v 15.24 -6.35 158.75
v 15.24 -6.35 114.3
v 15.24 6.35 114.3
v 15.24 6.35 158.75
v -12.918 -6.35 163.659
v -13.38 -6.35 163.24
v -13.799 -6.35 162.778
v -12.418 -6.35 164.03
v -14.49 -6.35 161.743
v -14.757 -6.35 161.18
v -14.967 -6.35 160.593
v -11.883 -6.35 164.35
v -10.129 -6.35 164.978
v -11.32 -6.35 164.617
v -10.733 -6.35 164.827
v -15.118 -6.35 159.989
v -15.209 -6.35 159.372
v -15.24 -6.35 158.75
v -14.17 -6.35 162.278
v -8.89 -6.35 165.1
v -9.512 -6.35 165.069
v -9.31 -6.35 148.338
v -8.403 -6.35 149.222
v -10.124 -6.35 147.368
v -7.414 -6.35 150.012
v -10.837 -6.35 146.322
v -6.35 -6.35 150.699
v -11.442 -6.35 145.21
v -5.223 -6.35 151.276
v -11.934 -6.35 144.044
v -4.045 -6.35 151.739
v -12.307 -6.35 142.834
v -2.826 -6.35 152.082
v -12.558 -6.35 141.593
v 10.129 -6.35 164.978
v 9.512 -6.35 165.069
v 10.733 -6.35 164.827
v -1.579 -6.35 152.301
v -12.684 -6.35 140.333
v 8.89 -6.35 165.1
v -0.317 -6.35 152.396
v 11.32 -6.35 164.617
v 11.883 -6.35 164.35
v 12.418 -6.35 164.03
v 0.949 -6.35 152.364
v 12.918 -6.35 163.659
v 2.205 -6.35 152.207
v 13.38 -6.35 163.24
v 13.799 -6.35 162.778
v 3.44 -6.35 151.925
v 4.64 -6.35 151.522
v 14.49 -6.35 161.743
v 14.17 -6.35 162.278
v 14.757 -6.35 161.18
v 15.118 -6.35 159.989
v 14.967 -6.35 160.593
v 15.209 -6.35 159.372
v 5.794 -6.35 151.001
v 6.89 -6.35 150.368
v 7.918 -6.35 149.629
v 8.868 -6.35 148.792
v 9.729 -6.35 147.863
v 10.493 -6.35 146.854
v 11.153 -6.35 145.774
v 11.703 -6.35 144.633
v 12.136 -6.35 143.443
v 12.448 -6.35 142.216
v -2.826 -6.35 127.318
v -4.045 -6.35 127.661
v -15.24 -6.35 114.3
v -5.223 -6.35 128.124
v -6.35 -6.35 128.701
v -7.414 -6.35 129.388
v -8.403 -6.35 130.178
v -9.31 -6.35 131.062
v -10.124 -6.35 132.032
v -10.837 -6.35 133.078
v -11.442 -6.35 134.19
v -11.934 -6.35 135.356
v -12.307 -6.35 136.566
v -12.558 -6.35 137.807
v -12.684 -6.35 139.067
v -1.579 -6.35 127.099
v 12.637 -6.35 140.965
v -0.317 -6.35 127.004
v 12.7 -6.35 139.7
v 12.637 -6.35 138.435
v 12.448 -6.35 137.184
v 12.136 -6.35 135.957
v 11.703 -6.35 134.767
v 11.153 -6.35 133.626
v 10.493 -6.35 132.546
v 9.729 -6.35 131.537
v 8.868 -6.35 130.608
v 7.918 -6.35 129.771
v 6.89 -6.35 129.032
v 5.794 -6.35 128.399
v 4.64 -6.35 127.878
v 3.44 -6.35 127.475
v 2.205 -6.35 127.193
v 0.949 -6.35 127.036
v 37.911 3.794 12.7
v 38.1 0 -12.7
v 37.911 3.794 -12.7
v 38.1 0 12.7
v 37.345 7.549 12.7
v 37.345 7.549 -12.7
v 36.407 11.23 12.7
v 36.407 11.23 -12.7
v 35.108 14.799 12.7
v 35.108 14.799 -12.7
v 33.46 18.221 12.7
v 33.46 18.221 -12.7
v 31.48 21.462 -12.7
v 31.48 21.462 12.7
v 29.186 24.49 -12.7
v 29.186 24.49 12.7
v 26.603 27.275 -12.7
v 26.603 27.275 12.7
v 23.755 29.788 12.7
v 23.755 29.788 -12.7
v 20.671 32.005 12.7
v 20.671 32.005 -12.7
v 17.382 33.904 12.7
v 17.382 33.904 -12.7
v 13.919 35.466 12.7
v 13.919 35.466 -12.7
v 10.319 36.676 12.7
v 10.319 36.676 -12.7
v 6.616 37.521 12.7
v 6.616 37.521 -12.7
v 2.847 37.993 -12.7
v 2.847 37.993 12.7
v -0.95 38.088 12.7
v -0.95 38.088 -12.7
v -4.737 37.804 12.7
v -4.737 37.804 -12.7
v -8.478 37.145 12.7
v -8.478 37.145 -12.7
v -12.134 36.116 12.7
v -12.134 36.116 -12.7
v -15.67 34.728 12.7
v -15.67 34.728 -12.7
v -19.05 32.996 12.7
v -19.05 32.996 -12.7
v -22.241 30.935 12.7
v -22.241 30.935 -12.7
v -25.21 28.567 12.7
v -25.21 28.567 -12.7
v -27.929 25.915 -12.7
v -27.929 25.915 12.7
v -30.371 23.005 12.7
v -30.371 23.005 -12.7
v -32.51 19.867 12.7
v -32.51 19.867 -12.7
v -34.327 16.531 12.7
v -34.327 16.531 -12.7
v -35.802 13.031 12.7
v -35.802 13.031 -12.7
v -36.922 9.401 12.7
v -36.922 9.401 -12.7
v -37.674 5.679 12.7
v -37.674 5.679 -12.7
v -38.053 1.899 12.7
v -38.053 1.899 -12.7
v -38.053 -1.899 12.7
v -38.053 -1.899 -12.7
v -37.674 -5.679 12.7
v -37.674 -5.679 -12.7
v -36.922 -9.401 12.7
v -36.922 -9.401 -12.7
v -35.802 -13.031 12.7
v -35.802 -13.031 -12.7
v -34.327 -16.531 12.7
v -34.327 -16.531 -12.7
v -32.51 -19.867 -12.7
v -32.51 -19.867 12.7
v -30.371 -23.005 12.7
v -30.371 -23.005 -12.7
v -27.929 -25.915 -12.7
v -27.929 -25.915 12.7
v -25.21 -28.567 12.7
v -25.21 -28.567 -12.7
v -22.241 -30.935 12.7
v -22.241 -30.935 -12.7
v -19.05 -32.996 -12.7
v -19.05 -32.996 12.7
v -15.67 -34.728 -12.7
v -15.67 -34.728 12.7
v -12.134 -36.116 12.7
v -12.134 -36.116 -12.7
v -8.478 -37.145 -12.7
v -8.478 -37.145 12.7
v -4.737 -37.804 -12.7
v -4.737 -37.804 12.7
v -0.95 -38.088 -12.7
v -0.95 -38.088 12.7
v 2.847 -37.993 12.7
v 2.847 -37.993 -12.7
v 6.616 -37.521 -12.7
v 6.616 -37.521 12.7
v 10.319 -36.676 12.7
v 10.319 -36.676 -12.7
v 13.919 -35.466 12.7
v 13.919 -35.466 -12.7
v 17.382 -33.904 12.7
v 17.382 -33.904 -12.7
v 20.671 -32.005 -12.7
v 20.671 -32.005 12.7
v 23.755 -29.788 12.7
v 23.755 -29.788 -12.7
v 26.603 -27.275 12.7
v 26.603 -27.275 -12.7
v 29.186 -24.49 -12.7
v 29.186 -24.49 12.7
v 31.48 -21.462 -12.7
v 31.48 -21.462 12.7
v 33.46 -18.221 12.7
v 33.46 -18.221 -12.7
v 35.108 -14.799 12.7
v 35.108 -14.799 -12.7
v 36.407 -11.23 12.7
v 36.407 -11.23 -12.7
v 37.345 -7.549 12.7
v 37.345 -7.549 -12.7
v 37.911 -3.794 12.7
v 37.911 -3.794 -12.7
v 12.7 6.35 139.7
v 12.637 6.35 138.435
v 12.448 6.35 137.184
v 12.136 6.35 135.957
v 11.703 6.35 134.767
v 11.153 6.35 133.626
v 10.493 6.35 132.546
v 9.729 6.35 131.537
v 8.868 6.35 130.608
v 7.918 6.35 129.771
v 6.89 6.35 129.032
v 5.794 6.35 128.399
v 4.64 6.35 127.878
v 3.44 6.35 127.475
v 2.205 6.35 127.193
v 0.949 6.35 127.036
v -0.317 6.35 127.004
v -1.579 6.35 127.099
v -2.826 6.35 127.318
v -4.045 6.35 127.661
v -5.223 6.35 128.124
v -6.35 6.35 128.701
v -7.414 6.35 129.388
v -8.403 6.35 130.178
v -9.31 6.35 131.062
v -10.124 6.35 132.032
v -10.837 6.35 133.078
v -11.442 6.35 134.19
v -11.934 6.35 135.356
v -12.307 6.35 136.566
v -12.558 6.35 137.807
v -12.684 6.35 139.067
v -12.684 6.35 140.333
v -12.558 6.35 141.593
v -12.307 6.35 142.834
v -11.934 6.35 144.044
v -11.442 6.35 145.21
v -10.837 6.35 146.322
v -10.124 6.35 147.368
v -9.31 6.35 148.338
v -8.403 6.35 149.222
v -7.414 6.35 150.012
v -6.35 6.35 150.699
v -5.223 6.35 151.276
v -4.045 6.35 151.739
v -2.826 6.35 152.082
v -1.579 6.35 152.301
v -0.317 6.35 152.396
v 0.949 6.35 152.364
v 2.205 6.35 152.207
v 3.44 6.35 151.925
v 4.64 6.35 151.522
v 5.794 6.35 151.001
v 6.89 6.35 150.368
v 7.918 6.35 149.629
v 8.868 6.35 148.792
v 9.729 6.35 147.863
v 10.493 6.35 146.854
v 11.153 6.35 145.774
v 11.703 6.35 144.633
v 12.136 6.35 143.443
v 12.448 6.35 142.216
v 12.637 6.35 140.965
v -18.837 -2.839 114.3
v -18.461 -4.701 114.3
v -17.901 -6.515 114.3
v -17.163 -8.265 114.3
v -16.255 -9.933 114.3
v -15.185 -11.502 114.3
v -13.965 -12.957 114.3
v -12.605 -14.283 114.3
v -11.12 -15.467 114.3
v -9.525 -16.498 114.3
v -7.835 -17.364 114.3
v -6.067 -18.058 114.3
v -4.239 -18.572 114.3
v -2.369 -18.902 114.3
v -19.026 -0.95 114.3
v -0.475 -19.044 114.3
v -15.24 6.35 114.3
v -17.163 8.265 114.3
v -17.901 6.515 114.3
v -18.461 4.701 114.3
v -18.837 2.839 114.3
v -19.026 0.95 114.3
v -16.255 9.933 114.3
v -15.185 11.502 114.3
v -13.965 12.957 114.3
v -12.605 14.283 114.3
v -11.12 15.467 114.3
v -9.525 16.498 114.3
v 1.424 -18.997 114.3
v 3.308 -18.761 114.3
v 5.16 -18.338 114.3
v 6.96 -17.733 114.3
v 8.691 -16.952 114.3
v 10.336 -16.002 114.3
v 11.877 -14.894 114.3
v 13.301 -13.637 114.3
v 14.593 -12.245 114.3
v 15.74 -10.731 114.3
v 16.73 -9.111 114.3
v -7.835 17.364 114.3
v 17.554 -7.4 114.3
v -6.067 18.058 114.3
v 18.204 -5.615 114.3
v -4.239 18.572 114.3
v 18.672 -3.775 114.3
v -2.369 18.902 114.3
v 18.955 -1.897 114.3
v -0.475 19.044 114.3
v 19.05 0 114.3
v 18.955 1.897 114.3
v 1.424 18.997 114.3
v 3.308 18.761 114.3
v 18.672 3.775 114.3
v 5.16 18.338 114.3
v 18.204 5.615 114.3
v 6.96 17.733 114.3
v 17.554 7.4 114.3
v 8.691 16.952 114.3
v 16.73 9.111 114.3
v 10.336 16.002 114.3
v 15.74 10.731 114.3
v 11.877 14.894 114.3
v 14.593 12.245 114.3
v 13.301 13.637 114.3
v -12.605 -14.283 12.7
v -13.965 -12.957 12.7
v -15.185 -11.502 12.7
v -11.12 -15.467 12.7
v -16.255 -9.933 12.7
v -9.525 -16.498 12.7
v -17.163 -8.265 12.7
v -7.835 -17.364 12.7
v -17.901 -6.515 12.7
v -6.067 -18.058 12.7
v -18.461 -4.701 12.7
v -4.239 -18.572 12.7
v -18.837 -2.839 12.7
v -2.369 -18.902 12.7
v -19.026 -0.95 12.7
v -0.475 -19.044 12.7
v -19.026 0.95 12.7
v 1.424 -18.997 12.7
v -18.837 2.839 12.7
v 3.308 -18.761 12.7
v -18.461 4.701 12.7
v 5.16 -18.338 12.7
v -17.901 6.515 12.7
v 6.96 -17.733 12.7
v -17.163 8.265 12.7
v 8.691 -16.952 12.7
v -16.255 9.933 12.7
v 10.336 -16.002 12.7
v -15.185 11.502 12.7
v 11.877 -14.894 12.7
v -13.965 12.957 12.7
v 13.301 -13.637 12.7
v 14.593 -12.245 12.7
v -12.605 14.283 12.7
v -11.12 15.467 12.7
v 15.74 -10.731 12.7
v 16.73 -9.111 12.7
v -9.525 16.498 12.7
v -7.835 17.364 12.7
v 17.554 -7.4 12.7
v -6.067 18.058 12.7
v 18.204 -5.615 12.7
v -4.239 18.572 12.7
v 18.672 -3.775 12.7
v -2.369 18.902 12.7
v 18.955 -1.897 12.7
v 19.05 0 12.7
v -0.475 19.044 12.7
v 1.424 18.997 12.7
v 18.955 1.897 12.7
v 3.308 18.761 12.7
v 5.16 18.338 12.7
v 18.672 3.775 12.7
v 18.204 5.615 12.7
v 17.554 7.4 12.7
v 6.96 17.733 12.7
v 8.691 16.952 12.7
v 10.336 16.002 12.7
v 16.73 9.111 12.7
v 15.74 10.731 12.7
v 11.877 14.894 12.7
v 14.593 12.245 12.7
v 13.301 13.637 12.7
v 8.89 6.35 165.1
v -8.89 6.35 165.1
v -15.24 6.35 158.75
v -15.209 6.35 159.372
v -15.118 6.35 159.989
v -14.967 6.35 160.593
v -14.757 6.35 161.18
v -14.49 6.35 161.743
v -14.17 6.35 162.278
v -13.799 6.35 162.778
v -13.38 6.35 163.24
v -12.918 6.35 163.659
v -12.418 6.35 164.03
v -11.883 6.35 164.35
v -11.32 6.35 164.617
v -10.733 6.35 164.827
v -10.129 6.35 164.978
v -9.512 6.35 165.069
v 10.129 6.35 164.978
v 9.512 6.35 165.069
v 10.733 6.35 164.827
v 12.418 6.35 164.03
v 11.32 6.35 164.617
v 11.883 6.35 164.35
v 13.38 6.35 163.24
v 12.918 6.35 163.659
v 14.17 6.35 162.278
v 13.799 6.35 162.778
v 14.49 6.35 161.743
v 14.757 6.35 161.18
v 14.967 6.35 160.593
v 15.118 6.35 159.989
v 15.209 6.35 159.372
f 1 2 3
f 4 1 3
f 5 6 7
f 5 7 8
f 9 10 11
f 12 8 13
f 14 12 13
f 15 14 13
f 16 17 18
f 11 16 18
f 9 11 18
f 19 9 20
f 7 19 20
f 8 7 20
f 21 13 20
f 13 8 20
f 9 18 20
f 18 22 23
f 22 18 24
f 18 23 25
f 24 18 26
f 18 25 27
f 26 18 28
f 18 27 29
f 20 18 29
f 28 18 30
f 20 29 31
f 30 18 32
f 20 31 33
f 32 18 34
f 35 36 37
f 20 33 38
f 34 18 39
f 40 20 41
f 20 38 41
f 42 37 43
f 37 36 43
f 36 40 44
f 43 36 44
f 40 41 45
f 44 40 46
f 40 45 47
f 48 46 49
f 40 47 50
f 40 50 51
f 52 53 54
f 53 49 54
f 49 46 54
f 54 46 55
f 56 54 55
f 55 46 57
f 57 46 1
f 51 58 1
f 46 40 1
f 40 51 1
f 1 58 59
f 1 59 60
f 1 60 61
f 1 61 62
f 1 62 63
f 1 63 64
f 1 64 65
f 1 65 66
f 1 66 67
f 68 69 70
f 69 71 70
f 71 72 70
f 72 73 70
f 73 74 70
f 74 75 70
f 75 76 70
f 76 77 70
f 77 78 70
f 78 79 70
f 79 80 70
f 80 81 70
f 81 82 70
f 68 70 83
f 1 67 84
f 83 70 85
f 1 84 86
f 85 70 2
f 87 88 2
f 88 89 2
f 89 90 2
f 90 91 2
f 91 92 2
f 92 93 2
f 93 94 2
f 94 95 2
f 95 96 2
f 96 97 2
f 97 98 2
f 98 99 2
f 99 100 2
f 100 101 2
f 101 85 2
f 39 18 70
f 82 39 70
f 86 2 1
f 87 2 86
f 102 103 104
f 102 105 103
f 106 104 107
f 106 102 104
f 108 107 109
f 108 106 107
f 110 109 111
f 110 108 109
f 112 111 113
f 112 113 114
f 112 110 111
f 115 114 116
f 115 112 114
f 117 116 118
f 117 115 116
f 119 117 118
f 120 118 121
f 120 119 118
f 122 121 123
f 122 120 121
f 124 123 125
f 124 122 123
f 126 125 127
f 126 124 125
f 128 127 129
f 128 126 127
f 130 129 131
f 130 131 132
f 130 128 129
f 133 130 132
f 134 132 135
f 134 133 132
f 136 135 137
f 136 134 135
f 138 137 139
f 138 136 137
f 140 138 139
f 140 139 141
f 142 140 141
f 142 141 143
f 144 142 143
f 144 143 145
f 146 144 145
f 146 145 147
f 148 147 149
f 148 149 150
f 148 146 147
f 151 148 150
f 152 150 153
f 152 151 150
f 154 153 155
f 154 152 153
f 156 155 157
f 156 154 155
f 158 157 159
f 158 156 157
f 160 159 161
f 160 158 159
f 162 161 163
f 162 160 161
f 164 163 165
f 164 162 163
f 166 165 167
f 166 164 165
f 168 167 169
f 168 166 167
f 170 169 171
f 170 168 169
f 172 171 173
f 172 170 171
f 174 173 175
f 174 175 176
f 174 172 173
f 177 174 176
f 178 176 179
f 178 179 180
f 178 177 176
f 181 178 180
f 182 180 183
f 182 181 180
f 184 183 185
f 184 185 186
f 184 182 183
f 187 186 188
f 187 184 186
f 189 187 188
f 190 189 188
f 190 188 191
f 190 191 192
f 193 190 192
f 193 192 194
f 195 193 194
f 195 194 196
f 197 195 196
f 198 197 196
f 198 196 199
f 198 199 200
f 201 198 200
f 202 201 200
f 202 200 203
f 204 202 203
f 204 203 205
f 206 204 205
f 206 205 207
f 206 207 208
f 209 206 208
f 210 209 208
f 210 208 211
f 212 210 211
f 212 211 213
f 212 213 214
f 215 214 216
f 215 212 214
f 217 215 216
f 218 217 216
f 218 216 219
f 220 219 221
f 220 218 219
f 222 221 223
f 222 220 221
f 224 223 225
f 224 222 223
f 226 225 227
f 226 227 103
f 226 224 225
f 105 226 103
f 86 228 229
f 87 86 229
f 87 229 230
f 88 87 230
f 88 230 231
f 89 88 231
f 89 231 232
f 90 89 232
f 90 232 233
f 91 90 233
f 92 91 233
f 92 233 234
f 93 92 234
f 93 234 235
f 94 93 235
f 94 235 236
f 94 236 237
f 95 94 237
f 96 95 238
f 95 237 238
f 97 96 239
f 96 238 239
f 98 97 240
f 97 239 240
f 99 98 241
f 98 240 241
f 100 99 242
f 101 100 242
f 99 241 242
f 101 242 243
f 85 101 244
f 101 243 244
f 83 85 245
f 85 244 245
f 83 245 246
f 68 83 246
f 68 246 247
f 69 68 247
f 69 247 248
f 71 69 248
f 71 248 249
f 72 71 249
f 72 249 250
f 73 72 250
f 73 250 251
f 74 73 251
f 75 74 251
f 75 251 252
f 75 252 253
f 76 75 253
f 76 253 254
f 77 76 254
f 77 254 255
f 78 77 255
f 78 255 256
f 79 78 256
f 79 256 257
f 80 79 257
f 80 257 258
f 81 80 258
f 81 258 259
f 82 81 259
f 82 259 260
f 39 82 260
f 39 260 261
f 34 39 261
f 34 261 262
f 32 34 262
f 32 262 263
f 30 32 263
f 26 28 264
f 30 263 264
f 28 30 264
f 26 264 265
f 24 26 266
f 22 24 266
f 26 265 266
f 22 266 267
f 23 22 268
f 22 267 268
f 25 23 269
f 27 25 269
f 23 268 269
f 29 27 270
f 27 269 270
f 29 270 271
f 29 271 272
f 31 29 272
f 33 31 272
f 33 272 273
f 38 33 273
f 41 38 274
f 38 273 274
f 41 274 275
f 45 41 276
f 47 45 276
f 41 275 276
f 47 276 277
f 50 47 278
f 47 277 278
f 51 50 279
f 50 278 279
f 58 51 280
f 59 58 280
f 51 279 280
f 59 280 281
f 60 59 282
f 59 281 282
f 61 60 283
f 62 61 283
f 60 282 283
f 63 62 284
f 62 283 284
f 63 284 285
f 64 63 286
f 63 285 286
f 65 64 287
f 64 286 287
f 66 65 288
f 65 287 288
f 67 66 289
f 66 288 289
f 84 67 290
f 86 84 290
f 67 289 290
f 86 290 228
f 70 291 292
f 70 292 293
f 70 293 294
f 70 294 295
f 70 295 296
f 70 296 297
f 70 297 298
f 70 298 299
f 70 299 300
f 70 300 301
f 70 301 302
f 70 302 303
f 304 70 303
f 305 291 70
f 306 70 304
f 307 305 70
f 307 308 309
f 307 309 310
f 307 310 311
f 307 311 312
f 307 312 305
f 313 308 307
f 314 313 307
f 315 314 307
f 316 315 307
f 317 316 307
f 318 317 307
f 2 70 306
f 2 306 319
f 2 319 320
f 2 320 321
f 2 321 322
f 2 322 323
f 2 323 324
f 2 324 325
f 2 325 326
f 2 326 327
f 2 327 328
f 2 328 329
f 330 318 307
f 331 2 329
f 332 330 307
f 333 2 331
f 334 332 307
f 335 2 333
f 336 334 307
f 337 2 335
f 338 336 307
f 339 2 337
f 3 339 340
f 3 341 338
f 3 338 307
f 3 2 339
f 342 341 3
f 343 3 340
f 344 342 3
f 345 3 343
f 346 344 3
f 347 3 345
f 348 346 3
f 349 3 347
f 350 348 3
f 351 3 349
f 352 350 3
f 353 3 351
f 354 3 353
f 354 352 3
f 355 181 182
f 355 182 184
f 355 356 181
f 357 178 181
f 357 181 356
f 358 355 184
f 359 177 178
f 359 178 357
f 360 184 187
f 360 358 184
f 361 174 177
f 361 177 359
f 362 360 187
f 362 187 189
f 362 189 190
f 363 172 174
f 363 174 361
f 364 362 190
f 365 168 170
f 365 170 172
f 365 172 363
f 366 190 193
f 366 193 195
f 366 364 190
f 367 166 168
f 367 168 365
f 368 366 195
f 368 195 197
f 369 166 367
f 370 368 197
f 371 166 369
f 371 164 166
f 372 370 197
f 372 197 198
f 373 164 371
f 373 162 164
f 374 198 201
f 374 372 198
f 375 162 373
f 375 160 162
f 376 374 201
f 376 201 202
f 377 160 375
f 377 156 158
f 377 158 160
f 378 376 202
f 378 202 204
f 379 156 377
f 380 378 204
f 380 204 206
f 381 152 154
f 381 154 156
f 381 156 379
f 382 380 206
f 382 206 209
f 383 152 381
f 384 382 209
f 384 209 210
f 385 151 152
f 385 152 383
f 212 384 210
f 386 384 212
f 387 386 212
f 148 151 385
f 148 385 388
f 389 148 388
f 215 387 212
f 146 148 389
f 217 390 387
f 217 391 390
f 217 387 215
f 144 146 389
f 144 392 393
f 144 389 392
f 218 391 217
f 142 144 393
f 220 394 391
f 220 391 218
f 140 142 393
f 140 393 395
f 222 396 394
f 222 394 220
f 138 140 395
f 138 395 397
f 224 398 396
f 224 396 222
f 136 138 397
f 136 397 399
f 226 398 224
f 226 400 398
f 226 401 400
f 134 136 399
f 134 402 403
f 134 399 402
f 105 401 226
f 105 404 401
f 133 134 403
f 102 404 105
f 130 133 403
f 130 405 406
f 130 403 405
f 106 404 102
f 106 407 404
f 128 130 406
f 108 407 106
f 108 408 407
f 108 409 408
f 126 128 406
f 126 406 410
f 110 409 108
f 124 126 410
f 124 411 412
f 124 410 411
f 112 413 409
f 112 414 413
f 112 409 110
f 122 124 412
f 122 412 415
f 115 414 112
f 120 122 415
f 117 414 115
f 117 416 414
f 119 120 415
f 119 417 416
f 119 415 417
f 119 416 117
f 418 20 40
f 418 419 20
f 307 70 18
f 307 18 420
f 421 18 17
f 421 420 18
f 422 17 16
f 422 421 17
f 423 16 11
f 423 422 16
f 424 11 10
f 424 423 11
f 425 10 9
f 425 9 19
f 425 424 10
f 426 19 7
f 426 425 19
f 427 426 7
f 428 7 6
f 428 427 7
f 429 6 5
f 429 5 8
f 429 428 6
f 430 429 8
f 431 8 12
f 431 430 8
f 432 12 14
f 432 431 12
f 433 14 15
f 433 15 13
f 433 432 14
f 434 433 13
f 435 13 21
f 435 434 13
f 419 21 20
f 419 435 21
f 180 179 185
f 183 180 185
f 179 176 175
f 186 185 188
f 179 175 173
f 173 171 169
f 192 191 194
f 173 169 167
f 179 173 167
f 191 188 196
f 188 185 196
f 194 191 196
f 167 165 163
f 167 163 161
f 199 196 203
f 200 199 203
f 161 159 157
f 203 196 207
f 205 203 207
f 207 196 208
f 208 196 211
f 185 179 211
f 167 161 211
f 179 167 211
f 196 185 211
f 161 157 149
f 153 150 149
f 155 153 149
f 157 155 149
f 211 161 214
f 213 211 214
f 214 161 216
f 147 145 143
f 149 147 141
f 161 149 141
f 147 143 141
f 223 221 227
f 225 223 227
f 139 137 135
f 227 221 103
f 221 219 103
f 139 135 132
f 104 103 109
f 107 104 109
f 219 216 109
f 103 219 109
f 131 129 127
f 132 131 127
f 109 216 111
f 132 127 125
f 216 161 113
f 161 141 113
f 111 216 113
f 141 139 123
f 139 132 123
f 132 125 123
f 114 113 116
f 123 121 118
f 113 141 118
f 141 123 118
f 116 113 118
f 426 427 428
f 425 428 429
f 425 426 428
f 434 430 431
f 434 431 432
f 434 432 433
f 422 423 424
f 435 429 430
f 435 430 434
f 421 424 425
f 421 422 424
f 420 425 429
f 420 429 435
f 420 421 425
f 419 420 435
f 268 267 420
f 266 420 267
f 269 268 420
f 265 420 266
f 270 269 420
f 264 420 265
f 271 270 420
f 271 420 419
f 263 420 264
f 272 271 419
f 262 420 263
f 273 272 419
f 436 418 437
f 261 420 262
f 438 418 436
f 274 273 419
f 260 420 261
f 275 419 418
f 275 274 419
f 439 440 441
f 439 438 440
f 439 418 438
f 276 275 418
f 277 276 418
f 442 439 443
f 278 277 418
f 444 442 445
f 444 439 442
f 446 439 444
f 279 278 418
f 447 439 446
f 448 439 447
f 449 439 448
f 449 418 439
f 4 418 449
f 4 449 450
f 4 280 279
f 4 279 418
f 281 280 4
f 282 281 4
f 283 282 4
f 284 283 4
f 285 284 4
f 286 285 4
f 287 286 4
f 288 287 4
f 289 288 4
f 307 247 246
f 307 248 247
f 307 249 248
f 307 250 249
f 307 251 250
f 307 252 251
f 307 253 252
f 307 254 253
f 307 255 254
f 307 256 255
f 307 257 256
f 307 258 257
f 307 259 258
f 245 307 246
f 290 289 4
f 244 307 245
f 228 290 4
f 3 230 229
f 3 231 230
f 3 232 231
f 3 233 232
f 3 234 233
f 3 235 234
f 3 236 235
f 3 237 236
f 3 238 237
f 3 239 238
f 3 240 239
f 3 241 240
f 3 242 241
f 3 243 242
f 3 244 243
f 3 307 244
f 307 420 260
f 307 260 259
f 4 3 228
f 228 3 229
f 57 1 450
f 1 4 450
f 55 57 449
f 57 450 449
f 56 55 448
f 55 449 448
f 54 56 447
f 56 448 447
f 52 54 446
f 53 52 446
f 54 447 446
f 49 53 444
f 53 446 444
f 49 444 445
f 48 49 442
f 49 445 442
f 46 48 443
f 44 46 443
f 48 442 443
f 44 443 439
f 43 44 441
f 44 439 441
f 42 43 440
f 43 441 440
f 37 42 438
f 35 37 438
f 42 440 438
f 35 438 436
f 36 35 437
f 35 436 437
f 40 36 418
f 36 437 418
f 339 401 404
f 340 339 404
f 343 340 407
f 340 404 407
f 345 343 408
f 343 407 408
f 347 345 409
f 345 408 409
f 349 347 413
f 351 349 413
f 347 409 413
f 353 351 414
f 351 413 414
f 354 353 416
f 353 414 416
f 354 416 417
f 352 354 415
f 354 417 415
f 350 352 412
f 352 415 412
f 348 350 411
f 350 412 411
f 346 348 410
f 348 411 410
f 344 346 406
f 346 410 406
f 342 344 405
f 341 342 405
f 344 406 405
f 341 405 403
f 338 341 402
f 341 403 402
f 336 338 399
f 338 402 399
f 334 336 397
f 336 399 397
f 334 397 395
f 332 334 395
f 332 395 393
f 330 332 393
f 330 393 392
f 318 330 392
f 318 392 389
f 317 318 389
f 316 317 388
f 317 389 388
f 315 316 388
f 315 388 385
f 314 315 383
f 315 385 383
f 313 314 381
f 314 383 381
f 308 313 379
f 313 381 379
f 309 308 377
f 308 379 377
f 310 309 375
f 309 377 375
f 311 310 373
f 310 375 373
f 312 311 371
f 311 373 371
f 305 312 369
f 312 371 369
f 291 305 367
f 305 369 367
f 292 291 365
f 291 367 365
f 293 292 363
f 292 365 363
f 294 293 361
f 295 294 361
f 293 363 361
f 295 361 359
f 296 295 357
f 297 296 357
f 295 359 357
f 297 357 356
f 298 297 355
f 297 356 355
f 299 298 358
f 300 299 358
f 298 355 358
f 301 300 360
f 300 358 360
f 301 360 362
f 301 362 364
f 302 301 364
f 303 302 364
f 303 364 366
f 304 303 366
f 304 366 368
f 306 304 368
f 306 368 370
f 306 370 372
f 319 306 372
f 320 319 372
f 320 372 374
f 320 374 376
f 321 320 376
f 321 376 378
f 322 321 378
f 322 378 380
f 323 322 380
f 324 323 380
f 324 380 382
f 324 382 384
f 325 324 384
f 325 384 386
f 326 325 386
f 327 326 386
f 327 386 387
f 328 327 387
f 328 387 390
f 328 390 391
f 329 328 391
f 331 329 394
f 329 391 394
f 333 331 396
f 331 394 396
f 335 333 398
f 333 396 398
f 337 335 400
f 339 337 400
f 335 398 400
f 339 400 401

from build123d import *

# Parameters (mm, degrees)
SKETCH2_R               = 38.1
BOSS_EXTRUDE1_DEPTH     = 12.7
SKETCH3_R               = 19.05
BOSS_EXTRUDE2_DEPTH     = 101.6
SKETCH4_W               = 30.48
SKETCH4_H               = 12.7
BOSS_EXTRUDE3_DEPTH     = 50.8
FILLET1_R               = 6.35
SKETCH5_R               = 12.7
CUT_EXTRUDE1_DEPTH      = 32.75
CUT_EXTRUDE1_DEPTH_BACK = 45.45


with BuildPart() as part:
    # Sketch2 → Boss-Extrude1 (new body, symmetric)
    with BuildSketch(Plane.XY):
        Circle(SKETCH2_R)
    extrude(amount=BOSS_EXTRUDE1_DEPTH, both=True)

    # Sketch3 → Boss-Extrude2 (add)
    with BuildSketch(Plane.XY.offset(12.7)):
        Circle(SKETCH3_R)
    extrude(amount=BOSS_EXTRUDE2_DEPTH)

    # Sketch4 → Boss-Extrude3 (add)
    with BuildSketch(Plane.XY.offset(114.3)):
        Rectangle(SKETCH4_W, SKETCH4_H)
    extrude(amount=BOSS_EXTRUDE3_DEPTH)

    # Fillet1
    fillet1_edges = [part.edges().sort_by_distance(p)[0] for p in [
        (15.24, 0, 165.1),
        (-15.24, 0, 165.1),
    ]]
    fillet(fillet1_edges, radius=FILLET1_R)

    # Sketch5 → Cut-Extrude1 (cut, two sides)
    with BuildSketch(Plane(origin=(0, 6.35, 0), x_dir=(1, 0, 0), z_dir=(0, 1, 0))) as cut_extrude1_sk:
        with Locations((0, -139.7)):
            Circle(SKETCH5_R)
    extrude(amount=CUT_EXTRUDE1_DEPTH, mode=Mode.SUBTRACT)
    extrude(cut_extrude1_sk.sketch, amount=-CUT_EXTRUDE1_DEPTH_BACK, mode=Mode.SUBTRACT)


solid = part.part
